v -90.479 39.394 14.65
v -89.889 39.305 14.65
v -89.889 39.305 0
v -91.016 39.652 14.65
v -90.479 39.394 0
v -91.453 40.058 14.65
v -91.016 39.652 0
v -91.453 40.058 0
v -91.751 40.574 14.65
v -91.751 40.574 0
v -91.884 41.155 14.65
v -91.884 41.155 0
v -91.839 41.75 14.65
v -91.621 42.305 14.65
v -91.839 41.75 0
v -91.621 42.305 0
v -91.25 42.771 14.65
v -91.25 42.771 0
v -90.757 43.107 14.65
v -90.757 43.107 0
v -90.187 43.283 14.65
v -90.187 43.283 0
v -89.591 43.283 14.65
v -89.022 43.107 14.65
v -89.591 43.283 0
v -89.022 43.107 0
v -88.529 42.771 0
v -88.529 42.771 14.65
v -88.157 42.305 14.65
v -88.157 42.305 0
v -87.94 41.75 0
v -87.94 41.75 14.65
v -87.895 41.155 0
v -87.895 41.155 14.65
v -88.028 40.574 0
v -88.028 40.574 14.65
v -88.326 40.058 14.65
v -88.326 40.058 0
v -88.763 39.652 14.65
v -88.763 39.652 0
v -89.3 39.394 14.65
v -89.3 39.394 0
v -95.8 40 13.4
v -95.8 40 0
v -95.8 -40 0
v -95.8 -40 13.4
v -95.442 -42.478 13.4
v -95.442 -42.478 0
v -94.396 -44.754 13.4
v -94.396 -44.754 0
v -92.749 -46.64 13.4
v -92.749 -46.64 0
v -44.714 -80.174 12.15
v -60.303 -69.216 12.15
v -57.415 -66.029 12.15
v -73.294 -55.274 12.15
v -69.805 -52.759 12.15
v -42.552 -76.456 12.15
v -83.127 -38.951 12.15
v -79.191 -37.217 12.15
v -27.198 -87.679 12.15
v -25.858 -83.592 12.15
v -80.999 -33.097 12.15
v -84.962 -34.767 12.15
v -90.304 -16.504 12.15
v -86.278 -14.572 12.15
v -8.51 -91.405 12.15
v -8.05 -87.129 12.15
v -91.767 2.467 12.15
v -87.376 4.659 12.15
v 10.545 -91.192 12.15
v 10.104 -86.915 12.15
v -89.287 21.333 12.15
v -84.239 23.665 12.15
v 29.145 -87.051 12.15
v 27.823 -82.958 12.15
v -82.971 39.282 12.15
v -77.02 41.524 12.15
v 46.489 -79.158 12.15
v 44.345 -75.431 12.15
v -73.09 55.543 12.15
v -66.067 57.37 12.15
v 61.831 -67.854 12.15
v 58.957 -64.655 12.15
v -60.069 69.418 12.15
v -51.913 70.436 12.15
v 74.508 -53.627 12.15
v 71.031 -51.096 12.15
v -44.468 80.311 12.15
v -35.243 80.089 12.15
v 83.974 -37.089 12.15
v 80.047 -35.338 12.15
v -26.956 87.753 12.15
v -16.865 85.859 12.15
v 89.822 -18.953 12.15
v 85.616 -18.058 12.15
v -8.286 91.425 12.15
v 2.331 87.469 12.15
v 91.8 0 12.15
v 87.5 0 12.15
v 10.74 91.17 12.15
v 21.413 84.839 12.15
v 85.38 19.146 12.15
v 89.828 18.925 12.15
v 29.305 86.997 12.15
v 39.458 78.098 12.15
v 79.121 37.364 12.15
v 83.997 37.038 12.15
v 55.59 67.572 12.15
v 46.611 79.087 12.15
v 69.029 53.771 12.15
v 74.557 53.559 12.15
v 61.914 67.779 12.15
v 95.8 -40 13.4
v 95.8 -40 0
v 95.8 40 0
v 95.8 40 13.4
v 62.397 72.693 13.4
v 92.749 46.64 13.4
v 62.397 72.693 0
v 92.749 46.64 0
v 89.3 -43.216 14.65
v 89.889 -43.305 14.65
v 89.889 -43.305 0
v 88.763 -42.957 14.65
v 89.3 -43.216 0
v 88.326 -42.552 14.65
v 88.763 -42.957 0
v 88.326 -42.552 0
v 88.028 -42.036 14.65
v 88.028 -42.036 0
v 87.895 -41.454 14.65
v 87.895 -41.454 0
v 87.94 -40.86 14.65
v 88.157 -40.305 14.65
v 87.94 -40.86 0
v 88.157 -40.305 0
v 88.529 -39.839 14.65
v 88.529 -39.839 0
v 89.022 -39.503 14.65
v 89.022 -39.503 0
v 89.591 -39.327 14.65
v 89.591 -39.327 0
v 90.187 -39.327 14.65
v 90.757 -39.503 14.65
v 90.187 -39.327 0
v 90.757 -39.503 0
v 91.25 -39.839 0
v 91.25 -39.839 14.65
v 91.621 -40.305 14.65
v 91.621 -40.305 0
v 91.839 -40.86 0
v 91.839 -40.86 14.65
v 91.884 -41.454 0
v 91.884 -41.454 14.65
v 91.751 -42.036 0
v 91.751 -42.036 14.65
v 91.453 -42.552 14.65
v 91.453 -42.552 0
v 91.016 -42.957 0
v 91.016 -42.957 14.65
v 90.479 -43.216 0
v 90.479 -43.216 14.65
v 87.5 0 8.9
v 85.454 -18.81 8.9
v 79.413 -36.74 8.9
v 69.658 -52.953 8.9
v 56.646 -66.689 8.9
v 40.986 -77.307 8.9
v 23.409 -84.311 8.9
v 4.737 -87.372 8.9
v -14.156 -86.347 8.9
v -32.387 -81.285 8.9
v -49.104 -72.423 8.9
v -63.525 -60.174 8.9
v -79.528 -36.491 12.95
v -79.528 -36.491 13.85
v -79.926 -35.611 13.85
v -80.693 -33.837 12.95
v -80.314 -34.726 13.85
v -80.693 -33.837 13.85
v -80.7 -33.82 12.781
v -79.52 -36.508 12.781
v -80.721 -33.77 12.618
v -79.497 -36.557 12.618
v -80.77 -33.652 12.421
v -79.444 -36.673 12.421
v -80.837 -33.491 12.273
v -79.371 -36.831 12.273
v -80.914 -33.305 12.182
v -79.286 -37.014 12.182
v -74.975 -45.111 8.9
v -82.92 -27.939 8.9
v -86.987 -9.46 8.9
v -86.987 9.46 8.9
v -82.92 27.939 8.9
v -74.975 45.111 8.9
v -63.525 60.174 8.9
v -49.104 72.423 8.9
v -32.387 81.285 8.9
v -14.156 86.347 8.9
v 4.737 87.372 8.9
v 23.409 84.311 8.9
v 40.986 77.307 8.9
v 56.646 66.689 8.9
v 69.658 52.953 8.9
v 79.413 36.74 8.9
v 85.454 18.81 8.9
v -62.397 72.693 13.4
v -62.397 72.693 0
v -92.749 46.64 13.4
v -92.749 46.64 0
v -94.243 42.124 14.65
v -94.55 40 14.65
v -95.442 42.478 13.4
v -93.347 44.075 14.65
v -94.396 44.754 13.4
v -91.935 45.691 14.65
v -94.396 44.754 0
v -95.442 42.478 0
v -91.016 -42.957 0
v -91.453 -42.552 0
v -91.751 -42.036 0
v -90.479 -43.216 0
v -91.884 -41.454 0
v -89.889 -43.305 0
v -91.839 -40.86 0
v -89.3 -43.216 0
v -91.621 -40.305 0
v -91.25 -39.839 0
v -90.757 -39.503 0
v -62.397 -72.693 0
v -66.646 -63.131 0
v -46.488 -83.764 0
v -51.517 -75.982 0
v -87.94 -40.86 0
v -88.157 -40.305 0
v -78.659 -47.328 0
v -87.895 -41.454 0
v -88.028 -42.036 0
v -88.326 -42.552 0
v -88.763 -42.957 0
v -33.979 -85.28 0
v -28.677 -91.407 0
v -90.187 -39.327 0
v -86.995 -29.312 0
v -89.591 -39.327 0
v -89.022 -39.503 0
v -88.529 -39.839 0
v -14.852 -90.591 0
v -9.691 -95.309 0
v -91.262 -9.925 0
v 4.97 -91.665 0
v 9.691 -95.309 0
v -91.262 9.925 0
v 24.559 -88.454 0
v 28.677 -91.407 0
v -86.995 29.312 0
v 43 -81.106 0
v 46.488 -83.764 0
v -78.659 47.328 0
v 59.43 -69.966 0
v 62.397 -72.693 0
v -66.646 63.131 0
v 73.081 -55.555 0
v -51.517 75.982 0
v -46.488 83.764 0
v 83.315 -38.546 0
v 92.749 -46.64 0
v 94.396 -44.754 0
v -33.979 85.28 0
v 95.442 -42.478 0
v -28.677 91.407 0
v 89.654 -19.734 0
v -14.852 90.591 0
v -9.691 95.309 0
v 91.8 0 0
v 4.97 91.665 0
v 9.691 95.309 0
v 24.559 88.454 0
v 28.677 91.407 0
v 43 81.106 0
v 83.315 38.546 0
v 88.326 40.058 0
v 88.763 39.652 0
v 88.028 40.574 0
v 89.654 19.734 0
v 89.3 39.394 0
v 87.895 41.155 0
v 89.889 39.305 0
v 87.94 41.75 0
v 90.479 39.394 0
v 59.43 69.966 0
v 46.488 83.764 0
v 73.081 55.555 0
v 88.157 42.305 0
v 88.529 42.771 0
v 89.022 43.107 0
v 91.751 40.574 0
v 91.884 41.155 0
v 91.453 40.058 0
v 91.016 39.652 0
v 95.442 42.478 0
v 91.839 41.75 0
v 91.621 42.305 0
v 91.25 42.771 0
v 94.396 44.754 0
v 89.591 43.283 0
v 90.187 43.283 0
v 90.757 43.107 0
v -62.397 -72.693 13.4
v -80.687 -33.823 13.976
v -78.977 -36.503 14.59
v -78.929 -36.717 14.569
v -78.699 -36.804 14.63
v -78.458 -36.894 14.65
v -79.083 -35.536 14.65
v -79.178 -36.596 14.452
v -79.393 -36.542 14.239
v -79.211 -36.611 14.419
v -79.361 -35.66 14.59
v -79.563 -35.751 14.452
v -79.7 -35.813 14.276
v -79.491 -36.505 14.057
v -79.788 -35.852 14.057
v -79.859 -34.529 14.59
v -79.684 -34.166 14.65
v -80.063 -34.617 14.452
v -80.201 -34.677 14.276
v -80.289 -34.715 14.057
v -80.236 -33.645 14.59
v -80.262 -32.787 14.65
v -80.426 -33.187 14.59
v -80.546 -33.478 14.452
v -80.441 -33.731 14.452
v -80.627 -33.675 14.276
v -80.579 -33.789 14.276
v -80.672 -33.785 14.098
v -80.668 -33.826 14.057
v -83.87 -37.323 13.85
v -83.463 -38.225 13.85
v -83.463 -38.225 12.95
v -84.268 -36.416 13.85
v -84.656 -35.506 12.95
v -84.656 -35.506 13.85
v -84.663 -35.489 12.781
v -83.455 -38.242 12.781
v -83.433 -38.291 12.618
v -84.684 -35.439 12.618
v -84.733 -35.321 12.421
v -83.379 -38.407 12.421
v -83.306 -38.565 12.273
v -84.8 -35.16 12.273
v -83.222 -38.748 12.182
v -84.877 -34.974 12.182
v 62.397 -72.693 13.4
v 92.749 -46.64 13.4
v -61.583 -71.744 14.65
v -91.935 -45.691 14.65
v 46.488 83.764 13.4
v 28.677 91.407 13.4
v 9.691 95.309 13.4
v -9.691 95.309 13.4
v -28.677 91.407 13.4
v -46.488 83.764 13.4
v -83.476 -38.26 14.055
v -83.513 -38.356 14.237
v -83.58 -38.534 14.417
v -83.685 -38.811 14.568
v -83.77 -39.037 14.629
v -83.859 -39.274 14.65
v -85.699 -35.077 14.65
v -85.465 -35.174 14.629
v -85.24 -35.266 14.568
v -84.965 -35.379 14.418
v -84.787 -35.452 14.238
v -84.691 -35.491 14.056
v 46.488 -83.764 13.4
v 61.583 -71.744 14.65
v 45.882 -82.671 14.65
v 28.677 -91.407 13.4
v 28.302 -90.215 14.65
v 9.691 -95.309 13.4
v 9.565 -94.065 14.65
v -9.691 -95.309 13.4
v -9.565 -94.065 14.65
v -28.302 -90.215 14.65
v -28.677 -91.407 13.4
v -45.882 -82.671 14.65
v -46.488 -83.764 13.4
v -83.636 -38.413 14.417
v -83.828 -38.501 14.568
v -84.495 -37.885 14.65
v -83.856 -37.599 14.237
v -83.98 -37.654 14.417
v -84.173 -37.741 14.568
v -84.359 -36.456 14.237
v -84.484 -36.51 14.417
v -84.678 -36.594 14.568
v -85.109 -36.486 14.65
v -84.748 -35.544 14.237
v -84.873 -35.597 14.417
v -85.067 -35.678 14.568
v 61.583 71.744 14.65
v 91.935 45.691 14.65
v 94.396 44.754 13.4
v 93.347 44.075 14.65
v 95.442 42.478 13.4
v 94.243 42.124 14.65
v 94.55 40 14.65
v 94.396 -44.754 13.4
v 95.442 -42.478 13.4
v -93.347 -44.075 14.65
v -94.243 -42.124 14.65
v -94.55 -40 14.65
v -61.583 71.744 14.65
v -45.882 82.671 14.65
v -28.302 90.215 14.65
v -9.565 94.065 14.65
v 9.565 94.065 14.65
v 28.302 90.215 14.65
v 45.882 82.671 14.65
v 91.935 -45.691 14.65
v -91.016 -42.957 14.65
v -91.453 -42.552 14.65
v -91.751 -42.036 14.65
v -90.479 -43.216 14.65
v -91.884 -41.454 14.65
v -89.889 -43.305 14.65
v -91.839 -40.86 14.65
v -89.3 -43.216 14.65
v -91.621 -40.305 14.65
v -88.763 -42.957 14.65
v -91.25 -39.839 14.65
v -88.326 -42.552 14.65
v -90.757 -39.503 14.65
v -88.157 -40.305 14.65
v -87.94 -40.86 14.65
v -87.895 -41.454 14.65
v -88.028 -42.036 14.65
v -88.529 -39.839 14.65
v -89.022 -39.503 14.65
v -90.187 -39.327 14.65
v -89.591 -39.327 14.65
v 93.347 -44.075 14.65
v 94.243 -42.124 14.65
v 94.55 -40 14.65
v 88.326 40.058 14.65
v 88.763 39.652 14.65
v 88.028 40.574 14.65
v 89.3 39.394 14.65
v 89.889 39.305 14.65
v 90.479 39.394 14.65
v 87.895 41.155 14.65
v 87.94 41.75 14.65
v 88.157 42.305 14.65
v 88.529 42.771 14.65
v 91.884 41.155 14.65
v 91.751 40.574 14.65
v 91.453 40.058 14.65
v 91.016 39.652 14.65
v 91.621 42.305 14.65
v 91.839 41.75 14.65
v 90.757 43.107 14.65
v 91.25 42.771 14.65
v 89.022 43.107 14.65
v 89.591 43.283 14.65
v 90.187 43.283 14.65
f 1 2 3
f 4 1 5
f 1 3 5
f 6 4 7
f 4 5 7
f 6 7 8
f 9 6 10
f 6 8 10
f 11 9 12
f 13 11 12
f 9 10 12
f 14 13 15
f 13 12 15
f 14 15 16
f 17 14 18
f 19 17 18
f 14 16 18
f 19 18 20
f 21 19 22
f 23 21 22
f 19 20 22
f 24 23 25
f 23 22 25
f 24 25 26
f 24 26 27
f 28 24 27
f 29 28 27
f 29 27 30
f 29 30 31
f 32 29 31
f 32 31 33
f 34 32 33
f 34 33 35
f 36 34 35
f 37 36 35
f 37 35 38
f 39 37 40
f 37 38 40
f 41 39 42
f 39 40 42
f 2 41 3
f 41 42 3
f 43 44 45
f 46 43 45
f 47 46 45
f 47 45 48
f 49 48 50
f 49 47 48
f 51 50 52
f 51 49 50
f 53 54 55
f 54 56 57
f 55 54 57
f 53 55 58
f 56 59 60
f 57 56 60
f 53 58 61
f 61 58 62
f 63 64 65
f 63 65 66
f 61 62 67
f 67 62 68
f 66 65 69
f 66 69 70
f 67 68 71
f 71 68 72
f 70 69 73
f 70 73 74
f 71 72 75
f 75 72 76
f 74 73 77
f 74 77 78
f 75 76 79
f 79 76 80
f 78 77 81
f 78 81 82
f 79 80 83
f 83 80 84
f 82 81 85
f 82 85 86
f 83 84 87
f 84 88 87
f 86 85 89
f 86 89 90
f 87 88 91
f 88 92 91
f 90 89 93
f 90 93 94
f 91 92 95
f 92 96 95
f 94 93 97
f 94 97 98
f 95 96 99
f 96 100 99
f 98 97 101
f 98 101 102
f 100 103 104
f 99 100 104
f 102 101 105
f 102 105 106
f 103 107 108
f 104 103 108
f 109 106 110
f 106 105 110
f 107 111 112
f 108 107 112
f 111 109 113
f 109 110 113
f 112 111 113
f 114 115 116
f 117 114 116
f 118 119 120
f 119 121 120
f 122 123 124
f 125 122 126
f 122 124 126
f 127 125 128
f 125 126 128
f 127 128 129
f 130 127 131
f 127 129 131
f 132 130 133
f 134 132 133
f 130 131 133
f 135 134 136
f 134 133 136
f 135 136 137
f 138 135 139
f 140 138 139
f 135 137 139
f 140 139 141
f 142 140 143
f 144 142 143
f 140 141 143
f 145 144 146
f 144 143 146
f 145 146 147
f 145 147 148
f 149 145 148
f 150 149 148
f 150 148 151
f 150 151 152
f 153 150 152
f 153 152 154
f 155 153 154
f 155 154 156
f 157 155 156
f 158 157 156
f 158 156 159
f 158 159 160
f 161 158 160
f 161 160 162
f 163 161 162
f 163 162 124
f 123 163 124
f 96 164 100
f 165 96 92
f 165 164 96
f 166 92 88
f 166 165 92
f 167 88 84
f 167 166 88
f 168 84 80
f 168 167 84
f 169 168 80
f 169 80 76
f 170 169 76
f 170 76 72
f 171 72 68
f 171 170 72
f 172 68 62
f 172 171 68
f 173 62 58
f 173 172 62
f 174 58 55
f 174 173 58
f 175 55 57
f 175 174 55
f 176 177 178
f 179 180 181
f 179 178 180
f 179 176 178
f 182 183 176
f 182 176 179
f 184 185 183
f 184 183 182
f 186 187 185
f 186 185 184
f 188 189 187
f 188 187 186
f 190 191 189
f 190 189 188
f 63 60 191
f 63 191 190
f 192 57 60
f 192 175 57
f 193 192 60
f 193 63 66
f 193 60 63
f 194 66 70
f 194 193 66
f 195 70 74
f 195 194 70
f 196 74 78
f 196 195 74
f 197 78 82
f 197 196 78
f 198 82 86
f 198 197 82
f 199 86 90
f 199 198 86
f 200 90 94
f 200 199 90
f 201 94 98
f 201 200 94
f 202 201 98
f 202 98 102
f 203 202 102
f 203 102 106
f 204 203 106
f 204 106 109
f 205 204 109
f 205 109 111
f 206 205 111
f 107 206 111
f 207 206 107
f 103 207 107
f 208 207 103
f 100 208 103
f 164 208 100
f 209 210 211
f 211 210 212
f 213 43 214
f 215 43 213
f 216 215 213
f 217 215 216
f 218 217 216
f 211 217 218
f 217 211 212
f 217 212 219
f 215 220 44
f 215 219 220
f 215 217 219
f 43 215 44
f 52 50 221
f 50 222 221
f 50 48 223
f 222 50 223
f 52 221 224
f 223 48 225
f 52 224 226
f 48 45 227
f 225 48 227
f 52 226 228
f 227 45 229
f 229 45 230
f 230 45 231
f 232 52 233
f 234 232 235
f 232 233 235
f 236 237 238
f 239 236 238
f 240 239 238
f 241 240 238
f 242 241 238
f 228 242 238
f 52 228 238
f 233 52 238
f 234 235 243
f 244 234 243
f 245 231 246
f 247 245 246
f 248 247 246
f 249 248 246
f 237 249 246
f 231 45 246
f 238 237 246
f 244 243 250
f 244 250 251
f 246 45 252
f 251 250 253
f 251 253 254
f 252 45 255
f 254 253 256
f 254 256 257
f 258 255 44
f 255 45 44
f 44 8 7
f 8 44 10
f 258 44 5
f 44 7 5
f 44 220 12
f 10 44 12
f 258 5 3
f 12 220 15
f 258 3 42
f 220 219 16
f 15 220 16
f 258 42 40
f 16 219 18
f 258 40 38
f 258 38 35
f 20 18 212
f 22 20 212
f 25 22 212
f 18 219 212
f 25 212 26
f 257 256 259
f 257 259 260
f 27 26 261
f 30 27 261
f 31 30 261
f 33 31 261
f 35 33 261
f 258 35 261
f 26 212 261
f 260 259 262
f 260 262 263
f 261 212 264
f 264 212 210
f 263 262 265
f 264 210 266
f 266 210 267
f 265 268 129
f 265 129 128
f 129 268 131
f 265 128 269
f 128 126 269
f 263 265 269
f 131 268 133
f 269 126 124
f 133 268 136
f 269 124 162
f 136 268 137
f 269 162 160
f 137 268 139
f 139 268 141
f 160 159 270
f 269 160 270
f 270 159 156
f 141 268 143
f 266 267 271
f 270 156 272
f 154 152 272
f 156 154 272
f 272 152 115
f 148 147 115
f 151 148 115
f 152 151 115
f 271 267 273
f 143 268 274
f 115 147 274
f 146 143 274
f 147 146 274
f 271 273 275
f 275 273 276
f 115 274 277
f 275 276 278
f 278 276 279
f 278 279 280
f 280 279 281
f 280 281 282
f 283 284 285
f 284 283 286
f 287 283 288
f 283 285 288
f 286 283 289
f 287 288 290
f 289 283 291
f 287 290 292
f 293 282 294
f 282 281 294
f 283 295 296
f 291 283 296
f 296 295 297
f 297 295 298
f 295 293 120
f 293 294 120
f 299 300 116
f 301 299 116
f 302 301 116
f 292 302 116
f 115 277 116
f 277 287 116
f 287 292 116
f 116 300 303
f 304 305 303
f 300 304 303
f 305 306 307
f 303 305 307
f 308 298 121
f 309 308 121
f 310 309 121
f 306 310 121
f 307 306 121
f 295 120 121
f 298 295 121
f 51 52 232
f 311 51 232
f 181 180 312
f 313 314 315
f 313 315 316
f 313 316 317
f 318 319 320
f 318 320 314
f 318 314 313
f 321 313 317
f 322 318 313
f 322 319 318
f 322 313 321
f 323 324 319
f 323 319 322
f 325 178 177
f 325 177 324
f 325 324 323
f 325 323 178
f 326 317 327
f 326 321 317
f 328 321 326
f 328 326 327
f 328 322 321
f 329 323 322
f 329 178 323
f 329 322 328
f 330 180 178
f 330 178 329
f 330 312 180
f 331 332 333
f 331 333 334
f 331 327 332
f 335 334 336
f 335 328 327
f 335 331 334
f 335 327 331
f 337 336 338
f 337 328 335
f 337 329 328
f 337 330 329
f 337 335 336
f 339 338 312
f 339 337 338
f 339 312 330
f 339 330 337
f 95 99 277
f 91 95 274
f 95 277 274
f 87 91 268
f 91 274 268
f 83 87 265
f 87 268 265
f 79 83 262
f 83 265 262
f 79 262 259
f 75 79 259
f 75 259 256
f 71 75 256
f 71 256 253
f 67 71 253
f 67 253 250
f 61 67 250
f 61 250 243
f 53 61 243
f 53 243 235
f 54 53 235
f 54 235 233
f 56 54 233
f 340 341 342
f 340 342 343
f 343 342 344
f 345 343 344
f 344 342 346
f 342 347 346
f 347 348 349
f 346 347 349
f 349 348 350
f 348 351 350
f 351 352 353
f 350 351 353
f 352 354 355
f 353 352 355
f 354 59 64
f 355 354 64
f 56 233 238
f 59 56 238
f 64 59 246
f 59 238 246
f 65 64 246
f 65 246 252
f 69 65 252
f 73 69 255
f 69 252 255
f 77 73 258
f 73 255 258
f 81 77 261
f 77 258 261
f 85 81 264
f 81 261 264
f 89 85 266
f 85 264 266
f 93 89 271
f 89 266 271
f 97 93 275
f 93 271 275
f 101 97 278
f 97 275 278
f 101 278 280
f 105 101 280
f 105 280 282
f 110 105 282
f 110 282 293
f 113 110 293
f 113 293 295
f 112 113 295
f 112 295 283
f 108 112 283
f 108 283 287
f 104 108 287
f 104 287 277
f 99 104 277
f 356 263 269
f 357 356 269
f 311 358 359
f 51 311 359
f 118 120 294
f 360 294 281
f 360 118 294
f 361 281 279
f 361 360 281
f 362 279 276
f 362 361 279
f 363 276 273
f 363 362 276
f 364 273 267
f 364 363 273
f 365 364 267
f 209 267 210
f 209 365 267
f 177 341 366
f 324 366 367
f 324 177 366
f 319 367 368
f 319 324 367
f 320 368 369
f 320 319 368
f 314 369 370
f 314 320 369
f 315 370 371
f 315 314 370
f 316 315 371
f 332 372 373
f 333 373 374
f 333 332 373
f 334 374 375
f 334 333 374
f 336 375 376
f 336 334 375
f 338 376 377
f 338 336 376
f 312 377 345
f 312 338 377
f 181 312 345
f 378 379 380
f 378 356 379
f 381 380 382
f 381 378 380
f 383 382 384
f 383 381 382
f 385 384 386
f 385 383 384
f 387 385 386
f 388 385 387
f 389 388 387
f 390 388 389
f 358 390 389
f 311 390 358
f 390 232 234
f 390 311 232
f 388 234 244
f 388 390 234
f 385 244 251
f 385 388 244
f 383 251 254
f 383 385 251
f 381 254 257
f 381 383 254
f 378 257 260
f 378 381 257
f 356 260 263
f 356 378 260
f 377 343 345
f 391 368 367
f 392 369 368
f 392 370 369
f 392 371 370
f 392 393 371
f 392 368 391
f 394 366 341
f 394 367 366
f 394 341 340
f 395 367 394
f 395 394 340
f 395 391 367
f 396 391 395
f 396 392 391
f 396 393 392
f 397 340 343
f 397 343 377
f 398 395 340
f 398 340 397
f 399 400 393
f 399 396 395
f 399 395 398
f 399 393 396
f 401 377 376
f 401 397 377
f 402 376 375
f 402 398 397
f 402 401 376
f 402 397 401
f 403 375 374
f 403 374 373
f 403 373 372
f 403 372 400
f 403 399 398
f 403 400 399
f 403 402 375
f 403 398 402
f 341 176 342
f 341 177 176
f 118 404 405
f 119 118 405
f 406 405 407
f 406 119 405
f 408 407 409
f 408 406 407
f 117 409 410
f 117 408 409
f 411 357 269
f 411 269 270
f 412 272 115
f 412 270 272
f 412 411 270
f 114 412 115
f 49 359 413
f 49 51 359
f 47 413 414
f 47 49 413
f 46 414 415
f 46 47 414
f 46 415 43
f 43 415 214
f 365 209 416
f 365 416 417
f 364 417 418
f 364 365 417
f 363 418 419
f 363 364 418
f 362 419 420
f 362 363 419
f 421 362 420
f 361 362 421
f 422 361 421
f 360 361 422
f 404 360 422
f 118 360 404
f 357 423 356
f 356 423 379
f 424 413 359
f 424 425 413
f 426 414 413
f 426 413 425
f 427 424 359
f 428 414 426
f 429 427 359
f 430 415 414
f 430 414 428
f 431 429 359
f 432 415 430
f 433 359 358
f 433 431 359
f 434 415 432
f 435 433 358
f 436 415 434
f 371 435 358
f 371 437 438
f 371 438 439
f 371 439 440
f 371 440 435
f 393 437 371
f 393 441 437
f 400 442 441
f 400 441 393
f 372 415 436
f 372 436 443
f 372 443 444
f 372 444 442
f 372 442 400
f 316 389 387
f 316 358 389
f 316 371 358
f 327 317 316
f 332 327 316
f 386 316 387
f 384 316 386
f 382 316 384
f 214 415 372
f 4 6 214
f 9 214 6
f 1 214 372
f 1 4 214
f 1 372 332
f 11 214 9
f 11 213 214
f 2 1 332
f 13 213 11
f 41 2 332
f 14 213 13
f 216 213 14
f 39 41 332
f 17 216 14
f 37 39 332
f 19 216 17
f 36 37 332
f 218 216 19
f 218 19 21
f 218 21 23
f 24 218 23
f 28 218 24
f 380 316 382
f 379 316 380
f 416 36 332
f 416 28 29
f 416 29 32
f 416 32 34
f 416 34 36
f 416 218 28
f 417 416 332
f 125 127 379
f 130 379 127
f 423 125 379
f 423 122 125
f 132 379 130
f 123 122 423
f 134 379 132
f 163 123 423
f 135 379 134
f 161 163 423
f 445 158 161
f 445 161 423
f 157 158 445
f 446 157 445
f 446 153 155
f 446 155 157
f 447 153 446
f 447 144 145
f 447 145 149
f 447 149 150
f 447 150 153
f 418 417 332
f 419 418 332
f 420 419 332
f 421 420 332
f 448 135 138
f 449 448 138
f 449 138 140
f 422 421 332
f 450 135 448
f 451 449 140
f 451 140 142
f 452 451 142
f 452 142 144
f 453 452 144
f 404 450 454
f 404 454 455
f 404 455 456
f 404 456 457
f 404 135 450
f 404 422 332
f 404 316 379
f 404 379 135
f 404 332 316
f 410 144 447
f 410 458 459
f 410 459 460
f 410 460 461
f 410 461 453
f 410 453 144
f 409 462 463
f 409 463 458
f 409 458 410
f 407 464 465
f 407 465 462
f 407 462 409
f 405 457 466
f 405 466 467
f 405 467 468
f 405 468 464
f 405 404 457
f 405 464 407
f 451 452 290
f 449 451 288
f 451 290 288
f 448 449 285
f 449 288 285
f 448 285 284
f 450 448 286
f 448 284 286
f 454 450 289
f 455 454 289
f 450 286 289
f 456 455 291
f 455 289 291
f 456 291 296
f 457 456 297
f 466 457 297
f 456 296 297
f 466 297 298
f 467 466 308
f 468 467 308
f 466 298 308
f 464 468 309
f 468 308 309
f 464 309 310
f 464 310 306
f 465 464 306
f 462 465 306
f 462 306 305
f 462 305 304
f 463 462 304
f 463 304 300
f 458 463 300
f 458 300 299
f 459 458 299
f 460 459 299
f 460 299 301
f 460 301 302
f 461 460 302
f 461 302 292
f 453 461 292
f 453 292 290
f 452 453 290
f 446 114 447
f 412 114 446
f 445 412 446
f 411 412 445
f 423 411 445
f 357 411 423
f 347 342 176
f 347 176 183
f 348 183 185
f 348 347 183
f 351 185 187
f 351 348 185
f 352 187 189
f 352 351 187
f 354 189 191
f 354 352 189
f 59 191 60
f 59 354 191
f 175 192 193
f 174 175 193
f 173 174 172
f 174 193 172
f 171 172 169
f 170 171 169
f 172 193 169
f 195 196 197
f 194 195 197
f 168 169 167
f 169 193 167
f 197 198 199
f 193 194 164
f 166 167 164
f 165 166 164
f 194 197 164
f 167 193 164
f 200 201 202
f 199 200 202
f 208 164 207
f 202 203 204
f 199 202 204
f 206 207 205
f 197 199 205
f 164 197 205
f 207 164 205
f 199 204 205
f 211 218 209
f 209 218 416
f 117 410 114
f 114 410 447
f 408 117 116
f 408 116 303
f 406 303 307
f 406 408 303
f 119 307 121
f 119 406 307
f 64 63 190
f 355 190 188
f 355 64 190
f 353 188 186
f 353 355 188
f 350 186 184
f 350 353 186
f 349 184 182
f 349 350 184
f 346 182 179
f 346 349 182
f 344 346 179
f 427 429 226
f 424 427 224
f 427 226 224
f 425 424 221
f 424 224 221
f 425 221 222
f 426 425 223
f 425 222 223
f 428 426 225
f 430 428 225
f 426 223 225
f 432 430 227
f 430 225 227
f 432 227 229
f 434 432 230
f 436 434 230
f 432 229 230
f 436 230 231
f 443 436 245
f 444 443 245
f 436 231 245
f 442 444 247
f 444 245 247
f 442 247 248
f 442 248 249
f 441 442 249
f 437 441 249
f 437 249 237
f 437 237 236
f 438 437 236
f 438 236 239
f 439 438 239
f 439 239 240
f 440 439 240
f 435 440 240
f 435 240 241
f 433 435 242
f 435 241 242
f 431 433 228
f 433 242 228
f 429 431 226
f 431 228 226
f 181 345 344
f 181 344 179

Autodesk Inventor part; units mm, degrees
ref_plane "YZ Plane" through (0, 0, 0) normal (1, 0, 0) x (0, 1, 0)
ref_plane "XZ Plane" through (0, 0, 0) normal (0, 1, 0) x (-1, 0, 0)
sketch "Sketch1" plane through (0, 0, 0) normal (0, 0, 1) x (1, 0, 0)
  line L0 (95.8, -44.0209) -> (95.8, 44.0209)
  line L1 (95.8, 44.0209) -> (0, 126.2524)
  circle A0 centre (0, 0) radius 91.8
  line L2 (-95.8, 44.0209) -> (-95.8, -44.0209)
  line L3 (0, -126.2524) -> (95.8, -44.0209)
  line L4 (0, 126.2524) -> (-95.8, 44.0209)
  line L5 (-95.8, -44.0209) -> (0, -126.2524)
  dimension "d47" = 183.6
extrude "Extrusion3" add sketch "Sketch1" along normal blind 14.65
ref_plane "Work Plane1" through (0, 0, 8.9) normal (0, 0, 1) x (1, 0, 0)
sketch "Sketch2" plane through (0, 0, 8.9) normal (0, 0, 1) x (1, 0, 0)
  circle A0 centre (0, 0) radius 91.8 projected
  circle A1 centre (0, 0) radius 87.5
  circle A2 centre (0, 0) radius 91.8 projected
  line L0 (95.8, -44.0209) -> (95.8, 44.0209) projected
  line L1 (0, -126.2524) -> (95.8, -44.0209) projected
  line L2 (-95.8, -44.0209) -> (0, -126.2524) projected
  line L3 (-95.8, 44.0209) -> (-95.8, -44.0209) projected
  line L4 (0, 126.2524) -> (-95.8, 44.0209) projected
  line L5 (95.8, 44.0209) -> (0, 126.2524) projected
  dimension "d54" = 4.3
extrude "Extrusion2" add sketch "Sketch2" along normal blind 5.75 contours A1
sketch "Sketch3" plane through (0, 0, 14.65) normal (0, 0, 1) x (1, 0, 0)
  line L0 (-79.5276, -36.4912) -> (-83.4629, -38.2253)
  circle A0 centre (0, 0) radius 89 projected
  circle A1 centre (0, 0) radius 89 projected
  circle A2 centre (0, 0) radius 91.8 projected
  circle A3 centre (0, 0) radius 91.8 projected
  line L1 (95.8, -44.0209) -> (0, -126.2524) projected
  line L2 (0, -126.2524) -> (-95.8, -44.0209) projected
  line L3 (-95.8, -44.0209) -> (-95.8, 44.0209) projected
  line L4 (-95.8, 44.0209) -> (0, 126.2524) projected
  line L5 (0, 126.2524) -> (95.8, 44.0209) projected
  line L6 (95.8, 44.0209) -> (95.8, -44.0209) projected
  circle A4 centre (0, 0) radius 91.8 projected
  line L7 (95.8, -44.0209) -> (95.8, 44.0209) projected
  line L8 (0, -126.2524) -> (95.8, -44.0209) projected
  line L9 (-95.8, -44.0209) -> (0, -126.2524) projected
  line L10 (-95.8, 44.0209) -> (-95.8, -44.0209) projected
  line L11 (0, 126.2524) -> (-95.8, 44.0209) projected
  line L12 (95.8, 44.0209) -> (0, 126.2524) projected
  circle A5 centre (0, 0) radius 87.5 projected
  circle A6 centre (0, 0) radius 87.5 projected
  line L13 (-84.6557, -35.5056) -> (-80.6929, -33.8366)
  point P0 (-84.0051, -35.376)
  point P1 (-83.4629, -38.2253)
  point P2 (-81.2652, -37.2569)
  point P3 (-84.6557, -35.5056)
  point P4 (-83.4629, -38.2253)
  dimension "d55" = 2.93
extrude "Extrusion1" add sketch "Sketch3" against normal blind 2.5 contours A5 L13 A0 L0 | A0 L13 A2 L0 picked at (12.3499, -86.9619) picked at (90.2127, 8.8539)
fillet "Fillet9" radius 0.8 1 edges at (-82.6743, -34.6711, 12.15)
fillet "Fillet8" radius 0.8 1 edges at (-81.4953, -37.3583, 12.15)
fillet "Fillet7" radius 0.8 2 edges at (-81.4953, -37.3583, 14.65) (-84.0703, -36.8703, 14.65)
fillet "Fillet7" radius 0.8 2 edges at (-80.1212, -35.1687, 14.65) (-82.6743, -34.6711, 14.65)
fillet "Fillet6" radius 8.7504 1 edges at (-95.8, 44.0209, 7.325)
fillet "Fillet5" radius 8.7504 1 edges at (-95.8, -44.0209, 7.325)
fillet "Fillet4" radius 8.7504 1 edges at (95.8, 44.0209, 7.325)
fillet "Fillet3" radius 8.7504 1 edges at (95.8, -44.0209, 7.325)
fillet "Fillet2" radius 95.8 1 edges at (0, -126.2524, 7.325)
fillet "Fillet1" radius 95.8 1 edges at (0, 126.2524, 7.325)
chamfer "Chamfer1" distance 1.25 angle 45 12 edges at (0, -95.8, 14.65) (-95.0007, 43.6536, 14.65) (77.573, -59.6663, 14.65) (-77.573, 59.6663, 14.65) (95.0007, -43.6536, 14.65) (0, 95.8, 14.65) (77.573, 59.6663, 14.65) (-95.0007, -43.6536, 14.65) (95.0007, 43.6536, 14.65) (-95.8, 0, 14.65) (-77.573, -59.6663, 14.65) (95.8, 0, 14.65)
hole "Hole4" at (-89.8894, 41.3049, 14.65) direction (0, 0, -1) diameter 4 depth 14.65
hole "Hole3" at (89.8894, -41.3049, 14.65) direction (0, 0, -1) diameter 4 depth 14.65
sketch "Sketch5" plane through (0, 0, 14.65) normal (0, 0, 1) x (1, 0, 0)
  point P0 (89.8894, -41.3049)
hole "Hole2" at (-89.8894, -41.3049, 14.65) direction (0, 0, -1) diameter 4 depth 14.65
sketch "Sketch4" plane through (0, 0, 14.65) normal (0, 0, 1) x (1, 0, 0)
  point P0 (-89.8894, 41.3049)
hole "Hole1" at (89.8894, 41.3049, 14.65) direction (0, 0, -1) diameter 4 depth 14.65
sketch "Sketch8" plane through (0, 0, 0) normal (1, 0, 0) x (0, 1, 0)
  line L0 (-91, 1) -> (-93.3, 1)
  line L1 (-88, 1.25) -> (-90, 1.25)
  line L2 (-93.3, 1) -> (-93.3, 0)
  line L3 (-90, 4.25) -> (-91, 4.25)
  line L4 (-90, 4.25) -> (-90, 1.25)
  line L5 (-88, 0) -> (-93.3, 0)
  line L6 (-91, 4.25) -> (-91, 1)
  line L7 (-88, 1.25) -> (-88, 0)
  line L8 (0, 0) -> (0, -10)
revolve "Revolution1" [suppressed]
sketch "Sketch9" plane through (0, 0, 0) normal (1, 0, 0) x (0, 1, 0)
  line L0 (-91, 1) -> (-93.3, 1)
  line L1 (-93.3, 1) -> (-93.3, 0)
  line L2 (0, 0) -> (-93.3, 0)
  line L3 (-91, 4.25) -> (-91, 1)
  line L4 (0, 4.25) -> (-91, 4.25)
  line L5 (0, 0) -> (0, 4.25)
  line L6 (0, 0) -> (0, -10)
revolve "Revolution2" [suppressed]
sketch "Sketch10" plane through (0, 0, 0) normal (1, 0, 0) x (0, 1, 0)
  line L0 (0, 4.25) -> (90, 4.25)
  line L1 (90, 4.25) -> (90, 1.25)
  line L2 (90, 1.25) -> (88, 1.25)
  line L3 (88, 1.25) -> (88, 0)
  line L4 (88, 0) -> (0, 0)
  line L5 (0, 0) -> (0, 4.25)
  line L6 (0, 4.25) -> (0, 0)
revolve "Revolution3" [suppressed]
sketch "Sketch6" plane through (0, 0, 14.65) normal (0, 0, 1) x (1, 0, 0)
  point P0 (-89.8894, -41.3049)
sketch "Sketch7" plane through (0, 0, 14.65) normal (0, 0, 1) x (1, 0, 0)
  point P0 (89.8894, 41.3049)
properties part number "Body_3DPrint"
